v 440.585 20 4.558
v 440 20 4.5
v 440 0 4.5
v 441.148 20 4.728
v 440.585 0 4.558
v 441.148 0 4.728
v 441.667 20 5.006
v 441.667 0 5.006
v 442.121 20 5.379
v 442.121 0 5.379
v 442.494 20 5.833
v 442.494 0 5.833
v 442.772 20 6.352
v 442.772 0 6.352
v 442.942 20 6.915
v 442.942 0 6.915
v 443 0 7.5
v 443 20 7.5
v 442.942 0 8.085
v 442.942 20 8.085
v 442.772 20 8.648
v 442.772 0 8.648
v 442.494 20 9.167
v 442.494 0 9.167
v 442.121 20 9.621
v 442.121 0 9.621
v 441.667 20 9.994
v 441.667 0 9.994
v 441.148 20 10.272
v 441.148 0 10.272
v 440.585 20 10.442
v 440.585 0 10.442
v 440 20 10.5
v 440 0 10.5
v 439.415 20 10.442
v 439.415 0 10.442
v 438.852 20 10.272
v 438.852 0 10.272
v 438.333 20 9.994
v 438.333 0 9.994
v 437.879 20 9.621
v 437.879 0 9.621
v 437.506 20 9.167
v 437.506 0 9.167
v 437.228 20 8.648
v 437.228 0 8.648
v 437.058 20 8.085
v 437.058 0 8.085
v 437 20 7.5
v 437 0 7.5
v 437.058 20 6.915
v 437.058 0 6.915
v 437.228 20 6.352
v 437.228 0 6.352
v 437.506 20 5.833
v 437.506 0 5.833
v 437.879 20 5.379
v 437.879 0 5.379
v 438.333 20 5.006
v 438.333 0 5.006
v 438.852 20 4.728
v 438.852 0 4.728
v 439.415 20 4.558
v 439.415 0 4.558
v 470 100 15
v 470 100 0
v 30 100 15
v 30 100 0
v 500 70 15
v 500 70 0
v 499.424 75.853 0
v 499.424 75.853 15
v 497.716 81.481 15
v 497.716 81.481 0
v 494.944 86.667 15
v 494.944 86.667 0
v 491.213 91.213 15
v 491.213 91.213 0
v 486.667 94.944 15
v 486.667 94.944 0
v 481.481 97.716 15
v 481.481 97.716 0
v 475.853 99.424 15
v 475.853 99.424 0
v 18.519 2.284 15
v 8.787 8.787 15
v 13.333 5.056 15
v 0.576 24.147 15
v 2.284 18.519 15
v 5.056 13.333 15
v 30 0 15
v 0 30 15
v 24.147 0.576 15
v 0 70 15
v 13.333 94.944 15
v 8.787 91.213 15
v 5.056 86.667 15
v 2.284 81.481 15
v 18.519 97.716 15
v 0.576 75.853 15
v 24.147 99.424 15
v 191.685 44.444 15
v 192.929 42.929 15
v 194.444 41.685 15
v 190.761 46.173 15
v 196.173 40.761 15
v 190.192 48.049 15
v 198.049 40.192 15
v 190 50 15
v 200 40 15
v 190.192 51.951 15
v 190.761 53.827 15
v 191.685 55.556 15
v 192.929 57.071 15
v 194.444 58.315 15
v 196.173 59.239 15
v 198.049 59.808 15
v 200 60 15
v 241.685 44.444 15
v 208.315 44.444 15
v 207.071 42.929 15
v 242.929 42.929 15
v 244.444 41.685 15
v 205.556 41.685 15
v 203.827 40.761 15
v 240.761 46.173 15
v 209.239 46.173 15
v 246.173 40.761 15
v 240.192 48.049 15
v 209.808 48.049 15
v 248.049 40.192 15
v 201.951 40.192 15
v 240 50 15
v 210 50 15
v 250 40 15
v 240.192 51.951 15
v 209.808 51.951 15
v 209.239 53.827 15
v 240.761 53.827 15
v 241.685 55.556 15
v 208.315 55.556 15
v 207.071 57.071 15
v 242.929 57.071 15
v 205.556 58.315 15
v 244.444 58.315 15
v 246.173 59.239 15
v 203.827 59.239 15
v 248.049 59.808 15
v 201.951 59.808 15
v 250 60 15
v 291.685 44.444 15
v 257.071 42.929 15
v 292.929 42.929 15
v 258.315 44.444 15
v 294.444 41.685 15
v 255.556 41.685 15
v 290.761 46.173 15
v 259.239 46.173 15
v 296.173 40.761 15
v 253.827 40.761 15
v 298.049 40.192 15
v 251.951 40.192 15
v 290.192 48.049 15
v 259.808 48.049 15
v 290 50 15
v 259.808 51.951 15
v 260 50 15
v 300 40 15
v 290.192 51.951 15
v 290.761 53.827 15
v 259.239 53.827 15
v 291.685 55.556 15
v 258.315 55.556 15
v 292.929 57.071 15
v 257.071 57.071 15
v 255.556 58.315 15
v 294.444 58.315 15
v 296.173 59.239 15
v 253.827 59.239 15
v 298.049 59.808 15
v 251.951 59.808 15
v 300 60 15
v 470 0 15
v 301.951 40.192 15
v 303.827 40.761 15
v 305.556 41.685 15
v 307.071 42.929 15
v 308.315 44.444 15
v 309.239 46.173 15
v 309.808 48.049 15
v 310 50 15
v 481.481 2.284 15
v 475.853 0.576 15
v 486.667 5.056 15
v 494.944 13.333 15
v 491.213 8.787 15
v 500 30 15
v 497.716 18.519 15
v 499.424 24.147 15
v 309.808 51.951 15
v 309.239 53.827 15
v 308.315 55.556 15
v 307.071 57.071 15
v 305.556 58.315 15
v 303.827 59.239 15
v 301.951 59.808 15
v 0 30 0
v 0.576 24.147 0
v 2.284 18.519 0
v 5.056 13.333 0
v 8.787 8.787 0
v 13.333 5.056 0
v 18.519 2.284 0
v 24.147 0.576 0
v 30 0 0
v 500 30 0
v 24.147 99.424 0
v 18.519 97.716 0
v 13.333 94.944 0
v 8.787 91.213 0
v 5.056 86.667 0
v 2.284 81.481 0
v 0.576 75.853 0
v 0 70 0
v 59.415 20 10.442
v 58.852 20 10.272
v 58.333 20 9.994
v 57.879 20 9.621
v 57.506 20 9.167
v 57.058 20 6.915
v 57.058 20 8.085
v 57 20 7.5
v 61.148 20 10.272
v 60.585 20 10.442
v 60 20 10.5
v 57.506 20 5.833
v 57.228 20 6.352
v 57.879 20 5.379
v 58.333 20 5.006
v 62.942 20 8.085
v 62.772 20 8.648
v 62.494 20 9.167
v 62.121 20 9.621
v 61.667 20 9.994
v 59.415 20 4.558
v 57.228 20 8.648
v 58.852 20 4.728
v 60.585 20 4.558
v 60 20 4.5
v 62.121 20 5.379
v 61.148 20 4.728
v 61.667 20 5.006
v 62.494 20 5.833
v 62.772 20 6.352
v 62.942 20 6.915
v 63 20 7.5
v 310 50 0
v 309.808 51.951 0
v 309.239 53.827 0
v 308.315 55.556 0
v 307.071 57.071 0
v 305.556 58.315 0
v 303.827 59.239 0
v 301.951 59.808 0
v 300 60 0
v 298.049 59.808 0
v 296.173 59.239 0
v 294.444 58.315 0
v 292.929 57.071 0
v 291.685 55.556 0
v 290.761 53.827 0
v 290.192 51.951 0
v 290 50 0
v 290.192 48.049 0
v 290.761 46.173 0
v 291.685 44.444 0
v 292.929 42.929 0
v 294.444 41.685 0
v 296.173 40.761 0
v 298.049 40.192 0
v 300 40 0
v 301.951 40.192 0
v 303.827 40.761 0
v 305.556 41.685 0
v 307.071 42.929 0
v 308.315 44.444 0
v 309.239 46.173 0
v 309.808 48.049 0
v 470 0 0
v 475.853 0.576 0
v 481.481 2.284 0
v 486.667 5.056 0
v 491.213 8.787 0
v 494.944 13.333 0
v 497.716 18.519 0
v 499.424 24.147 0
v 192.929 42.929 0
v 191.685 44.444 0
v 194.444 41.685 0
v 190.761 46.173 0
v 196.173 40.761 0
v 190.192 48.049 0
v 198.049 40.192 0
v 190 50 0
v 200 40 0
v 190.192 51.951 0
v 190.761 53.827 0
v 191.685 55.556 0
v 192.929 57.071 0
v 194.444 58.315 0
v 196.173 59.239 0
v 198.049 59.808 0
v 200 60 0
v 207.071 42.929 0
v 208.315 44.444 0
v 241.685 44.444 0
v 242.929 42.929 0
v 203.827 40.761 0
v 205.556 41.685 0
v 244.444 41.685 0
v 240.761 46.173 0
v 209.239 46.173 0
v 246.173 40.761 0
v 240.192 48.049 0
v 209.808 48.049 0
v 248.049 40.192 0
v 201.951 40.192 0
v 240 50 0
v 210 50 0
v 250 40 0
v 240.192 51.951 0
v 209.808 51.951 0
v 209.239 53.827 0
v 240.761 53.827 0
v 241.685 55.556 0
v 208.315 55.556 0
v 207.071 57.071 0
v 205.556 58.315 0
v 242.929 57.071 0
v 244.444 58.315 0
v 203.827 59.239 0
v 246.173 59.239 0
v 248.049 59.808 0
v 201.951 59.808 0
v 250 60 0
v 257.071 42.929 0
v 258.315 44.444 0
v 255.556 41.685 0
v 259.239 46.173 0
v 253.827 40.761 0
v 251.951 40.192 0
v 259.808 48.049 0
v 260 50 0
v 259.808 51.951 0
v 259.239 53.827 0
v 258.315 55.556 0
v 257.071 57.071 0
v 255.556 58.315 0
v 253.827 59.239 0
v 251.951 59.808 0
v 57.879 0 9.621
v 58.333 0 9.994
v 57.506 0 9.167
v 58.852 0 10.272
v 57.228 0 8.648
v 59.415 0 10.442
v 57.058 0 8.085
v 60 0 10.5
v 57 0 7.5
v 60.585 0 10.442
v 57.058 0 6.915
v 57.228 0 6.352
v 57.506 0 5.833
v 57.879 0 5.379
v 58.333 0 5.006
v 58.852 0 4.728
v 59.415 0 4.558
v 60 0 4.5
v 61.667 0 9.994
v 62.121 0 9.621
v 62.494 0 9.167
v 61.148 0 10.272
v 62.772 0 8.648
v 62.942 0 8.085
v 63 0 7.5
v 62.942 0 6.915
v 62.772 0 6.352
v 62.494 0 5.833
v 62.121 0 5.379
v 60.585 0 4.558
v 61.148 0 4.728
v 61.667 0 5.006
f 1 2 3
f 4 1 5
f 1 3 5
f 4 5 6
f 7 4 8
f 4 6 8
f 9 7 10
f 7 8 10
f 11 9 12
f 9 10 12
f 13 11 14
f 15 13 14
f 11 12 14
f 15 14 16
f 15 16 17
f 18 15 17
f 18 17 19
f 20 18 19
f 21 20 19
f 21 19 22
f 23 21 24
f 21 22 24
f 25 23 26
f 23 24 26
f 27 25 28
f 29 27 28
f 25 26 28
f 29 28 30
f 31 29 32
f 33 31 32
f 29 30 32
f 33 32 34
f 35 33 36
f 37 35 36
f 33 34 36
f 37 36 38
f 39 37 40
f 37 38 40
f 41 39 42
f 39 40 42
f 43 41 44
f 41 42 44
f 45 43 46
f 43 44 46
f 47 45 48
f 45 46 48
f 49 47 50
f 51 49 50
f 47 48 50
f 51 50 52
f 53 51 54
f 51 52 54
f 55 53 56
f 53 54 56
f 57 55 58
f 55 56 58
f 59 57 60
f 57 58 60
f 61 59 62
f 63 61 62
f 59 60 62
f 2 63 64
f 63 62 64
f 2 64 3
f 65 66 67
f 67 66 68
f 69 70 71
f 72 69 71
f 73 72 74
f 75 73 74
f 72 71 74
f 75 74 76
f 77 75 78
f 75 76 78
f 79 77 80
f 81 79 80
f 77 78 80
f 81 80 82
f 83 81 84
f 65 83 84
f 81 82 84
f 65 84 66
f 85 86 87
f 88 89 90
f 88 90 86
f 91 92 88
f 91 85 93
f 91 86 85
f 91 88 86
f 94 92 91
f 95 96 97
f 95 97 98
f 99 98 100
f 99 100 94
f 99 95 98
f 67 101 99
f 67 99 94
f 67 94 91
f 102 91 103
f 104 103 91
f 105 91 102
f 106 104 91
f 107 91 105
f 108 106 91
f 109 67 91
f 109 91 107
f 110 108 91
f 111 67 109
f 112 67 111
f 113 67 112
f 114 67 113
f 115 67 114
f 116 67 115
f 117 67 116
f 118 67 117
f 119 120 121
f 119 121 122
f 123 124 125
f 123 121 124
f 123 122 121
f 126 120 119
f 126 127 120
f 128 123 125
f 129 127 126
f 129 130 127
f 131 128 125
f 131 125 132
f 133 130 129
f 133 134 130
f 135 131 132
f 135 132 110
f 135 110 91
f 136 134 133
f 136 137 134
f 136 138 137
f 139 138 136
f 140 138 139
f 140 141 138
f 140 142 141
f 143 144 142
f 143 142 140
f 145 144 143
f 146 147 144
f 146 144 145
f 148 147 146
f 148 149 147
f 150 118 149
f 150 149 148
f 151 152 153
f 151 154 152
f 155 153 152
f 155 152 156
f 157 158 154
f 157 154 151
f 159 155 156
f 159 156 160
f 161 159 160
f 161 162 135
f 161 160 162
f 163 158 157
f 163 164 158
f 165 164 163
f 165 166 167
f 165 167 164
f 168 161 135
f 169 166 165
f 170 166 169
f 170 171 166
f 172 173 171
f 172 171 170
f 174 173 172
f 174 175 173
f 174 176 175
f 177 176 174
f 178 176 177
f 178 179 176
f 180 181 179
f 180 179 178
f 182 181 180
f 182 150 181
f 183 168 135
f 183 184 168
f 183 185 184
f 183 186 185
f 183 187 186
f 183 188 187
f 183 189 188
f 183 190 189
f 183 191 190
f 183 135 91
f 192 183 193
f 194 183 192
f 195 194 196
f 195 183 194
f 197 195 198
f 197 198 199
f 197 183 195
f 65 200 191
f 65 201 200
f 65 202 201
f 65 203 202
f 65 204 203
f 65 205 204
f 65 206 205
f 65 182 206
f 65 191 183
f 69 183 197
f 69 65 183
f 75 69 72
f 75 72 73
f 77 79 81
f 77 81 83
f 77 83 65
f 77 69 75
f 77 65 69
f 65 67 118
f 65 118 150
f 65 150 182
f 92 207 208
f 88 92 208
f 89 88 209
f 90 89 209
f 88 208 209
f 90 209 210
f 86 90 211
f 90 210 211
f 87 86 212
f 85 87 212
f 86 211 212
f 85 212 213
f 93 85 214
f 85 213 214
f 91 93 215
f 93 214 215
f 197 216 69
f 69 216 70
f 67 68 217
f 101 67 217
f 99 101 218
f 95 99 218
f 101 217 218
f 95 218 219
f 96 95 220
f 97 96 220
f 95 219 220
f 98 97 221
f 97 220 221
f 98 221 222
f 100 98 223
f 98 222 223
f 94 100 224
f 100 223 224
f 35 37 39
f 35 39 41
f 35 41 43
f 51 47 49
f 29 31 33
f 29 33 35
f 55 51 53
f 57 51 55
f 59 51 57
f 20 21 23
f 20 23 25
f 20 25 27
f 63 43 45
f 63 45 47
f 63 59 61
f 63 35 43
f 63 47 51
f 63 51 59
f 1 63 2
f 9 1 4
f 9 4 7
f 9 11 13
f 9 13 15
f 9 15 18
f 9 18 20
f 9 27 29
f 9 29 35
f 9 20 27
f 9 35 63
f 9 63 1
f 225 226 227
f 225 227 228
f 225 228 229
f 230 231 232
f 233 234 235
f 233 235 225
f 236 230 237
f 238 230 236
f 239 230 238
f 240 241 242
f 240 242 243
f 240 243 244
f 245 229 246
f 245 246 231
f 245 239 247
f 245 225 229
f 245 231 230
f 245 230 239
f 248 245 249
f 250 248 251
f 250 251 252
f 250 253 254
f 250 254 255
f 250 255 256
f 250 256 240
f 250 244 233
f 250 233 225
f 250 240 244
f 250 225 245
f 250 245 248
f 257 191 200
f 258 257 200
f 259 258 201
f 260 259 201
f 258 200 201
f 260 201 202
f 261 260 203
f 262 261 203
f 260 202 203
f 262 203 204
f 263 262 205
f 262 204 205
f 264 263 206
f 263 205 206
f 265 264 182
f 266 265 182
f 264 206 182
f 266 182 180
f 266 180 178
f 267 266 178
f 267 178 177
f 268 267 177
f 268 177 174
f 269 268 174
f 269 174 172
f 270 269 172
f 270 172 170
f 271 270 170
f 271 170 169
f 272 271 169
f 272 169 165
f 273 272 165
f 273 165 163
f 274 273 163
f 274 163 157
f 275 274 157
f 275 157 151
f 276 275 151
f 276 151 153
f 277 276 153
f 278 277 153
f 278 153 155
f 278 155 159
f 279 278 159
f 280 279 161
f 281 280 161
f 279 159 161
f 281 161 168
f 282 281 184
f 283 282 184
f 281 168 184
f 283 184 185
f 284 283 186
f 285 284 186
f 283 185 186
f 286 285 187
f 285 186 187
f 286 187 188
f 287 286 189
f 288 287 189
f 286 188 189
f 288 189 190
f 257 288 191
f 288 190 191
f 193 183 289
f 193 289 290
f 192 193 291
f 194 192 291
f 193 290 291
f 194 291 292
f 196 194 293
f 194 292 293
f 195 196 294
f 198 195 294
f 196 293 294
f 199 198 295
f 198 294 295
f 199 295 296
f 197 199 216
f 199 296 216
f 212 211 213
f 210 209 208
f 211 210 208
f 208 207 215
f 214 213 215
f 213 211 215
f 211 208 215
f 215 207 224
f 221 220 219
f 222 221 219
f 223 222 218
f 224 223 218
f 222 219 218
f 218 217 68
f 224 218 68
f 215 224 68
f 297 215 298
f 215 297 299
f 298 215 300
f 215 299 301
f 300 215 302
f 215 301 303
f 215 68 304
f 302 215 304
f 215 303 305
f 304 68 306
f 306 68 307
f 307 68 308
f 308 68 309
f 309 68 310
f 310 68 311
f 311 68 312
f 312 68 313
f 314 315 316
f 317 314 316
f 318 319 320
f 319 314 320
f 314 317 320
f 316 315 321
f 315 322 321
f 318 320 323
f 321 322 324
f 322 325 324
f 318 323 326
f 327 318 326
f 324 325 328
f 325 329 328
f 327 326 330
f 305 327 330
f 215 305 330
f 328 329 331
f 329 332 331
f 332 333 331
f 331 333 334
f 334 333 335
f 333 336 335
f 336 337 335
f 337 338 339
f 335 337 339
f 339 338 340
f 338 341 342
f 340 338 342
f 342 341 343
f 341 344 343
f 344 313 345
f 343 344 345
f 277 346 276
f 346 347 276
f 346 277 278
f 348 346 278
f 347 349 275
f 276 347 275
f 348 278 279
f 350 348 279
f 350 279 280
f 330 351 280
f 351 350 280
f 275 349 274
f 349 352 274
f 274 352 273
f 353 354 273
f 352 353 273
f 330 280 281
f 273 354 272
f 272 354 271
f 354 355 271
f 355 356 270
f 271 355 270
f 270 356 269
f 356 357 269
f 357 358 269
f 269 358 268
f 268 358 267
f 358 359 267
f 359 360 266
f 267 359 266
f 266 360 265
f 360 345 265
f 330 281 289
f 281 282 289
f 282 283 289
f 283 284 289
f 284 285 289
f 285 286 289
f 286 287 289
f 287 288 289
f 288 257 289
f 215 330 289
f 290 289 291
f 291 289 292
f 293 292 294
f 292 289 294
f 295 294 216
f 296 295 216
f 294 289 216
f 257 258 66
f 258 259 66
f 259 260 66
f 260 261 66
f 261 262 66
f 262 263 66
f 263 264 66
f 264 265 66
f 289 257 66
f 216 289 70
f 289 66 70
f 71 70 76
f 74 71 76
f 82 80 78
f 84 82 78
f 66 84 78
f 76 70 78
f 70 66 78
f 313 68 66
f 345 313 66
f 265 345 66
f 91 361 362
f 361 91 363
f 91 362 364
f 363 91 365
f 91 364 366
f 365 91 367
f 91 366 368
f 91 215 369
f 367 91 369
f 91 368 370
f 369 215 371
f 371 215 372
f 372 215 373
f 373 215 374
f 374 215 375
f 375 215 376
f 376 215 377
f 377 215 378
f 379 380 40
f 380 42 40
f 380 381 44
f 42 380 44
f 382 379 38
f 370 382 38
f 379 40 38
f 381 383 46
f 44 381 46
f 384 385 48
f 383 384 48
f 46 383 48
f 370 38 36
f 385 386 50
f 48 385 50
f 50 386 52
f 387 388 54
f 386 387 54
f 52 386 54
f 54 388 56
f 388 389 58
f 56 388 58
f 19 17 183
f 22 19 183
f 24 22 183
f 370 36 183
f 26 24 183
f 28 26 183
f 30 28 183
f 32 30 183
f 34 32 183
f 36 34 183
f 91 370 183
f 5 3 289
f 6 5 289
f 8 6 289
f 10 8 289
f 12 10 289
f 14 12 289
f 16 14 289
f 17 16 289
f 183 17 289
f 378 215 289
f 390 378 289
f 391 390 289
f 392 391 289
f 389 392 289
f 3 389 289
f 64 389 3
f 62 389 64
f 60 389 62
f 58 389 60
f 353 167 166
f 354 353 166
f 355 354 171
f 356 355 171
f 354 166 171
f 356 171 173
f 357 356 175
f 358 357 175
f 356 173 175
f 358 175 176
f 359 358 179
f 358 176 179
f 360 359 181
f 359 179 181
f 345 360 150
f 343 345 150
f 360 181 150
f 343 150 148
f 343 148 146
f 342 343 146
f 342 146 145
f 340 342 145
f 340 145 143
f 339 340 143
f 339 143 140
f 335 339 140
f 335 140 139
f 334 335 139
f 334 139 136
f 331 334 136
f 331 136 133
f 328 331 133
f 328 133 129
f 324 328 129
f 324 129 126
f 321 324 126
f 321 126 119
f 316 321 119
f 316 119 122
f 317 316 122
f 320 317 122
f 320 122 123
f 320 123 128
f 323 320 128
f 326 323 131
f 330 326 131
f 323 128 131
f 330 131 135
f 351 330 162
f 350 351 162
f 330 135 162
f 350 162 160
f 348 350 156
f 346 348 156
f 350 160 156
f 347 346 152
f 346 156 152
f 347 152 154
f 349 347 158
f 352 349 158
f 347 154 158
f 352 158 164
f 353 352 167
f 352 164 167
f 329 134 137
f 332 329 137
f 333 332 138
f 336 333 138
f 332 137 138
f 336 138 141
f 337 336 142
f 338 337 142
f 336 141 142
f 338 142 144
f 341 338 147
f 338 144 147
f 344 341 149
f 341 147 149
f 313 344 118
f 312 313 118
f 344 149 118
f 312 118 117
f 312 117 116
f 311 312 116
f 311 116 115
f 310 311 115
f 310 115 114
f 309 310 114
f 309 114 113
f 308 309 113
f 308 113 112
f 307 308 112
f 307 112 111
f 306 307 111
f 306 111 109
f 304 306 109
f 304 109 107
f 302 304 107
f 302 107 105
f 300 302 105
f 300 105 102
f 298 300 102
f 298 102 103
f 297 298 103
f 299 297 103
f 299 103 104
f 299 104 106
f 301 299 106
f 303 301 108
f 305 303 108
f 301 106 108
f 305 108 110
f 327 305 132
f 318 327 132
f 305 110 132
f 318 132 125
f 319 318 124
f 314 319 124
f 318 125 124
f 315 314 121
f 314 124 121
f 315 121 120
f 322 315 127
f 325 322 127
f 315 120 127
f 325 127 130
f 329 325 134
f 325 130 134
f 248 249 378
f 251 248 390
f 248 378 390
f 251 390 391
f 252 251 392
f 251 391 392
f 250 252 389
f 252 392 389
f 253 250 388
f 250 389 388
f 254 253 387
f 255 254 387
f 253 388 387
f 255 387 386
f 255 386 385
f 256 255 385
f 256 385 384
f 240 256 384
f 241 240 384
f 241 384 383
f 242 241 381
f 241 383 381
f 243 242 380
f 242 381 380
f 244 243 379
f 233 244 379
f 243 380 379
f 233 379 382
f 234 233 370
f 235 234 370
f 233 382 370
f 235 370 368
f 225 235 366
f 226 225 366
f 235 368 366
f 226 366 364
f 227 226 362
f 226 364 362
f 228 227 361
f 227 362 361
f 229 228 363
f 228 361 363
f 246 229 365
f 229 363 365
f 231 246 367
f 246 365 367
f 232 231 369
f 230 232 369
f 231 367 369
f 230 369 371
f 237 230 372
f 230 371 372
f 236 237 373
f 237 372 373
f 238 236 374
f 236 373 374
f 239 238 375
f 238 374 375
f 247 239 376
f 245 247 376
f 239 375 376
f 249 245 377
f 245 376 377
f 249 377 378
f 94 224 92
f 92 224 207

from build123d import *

# Parameters (mm, degrees)
BOSS_EXTRU_1_DEPTH      = 15
ESQUISSE2_R             = 10
ENL_V_MAT_EXTRU_2_DEPTH = 511.122534299
ESQUISSE3_R             = 3
ENL_V_MAT_EXTRU_3_DEPTH = 20


with BuildPart() as part:
    # Esquisse1 → Boss.-Extru.1 (new body)
    with BuildSketch(Plane.XY):
        with BuildLine():
            Line((30, 0), (470, 0))
            ThreePointArc((470, 0), (491.213203436, 8.786796564), (500, 30))
            Line((500, 30), (500, 70))
            ThreePointArc((500, 70), (491.213203436, 91.213203436), (470, 100))
            Line((470, 100), (30, 100))
            ThreePointArc((30, 100), (8.786796564, 91.213203436), (0, 70))
            Line((0, 70), (0, 30))
            ThreePointArc((0, 30), (8.786796564, 8.786796564), (30, 0))
        make_face()
    extrude(amount=BOSS_EXTRU_1_DEPTH)

    # Esquisse2 → Enlèv. mat.-Extru.2 (cut, through all)
    with BuildSketch(Plane.XY.offset(15)):
        with Locations((200, 50)):
            Circle(ESQUISSE2_R)
        with Locations((250, 50)):
            Circle(ESQUISSE2_R)
        with Locations((300, 50)):
            Circle(ESQUISSE2_R)
    extrude(amount=-ENL_V_MAT_EXTRU_2_DEPTH, mode=Mode.SUBTRACT)

    # Esquisse3 → Enlèv. mat.-Extru.3 (cut)
    with BuildSketch(Plane.XZ):
        with Locations(Location((60, 7.5, 0), (0, 0, 270))):
            Circle(ESQUISSE3_R)
        with Locations(Location((440, 7.5, 0), (0, 0, 270))):
            Circle(ESQUISSE3_R)
    extrude(amount=-ENL_V_MAT_EXTRU_3_DEPTH, mode=Mode.SUBTRACT)


solid = part.part
